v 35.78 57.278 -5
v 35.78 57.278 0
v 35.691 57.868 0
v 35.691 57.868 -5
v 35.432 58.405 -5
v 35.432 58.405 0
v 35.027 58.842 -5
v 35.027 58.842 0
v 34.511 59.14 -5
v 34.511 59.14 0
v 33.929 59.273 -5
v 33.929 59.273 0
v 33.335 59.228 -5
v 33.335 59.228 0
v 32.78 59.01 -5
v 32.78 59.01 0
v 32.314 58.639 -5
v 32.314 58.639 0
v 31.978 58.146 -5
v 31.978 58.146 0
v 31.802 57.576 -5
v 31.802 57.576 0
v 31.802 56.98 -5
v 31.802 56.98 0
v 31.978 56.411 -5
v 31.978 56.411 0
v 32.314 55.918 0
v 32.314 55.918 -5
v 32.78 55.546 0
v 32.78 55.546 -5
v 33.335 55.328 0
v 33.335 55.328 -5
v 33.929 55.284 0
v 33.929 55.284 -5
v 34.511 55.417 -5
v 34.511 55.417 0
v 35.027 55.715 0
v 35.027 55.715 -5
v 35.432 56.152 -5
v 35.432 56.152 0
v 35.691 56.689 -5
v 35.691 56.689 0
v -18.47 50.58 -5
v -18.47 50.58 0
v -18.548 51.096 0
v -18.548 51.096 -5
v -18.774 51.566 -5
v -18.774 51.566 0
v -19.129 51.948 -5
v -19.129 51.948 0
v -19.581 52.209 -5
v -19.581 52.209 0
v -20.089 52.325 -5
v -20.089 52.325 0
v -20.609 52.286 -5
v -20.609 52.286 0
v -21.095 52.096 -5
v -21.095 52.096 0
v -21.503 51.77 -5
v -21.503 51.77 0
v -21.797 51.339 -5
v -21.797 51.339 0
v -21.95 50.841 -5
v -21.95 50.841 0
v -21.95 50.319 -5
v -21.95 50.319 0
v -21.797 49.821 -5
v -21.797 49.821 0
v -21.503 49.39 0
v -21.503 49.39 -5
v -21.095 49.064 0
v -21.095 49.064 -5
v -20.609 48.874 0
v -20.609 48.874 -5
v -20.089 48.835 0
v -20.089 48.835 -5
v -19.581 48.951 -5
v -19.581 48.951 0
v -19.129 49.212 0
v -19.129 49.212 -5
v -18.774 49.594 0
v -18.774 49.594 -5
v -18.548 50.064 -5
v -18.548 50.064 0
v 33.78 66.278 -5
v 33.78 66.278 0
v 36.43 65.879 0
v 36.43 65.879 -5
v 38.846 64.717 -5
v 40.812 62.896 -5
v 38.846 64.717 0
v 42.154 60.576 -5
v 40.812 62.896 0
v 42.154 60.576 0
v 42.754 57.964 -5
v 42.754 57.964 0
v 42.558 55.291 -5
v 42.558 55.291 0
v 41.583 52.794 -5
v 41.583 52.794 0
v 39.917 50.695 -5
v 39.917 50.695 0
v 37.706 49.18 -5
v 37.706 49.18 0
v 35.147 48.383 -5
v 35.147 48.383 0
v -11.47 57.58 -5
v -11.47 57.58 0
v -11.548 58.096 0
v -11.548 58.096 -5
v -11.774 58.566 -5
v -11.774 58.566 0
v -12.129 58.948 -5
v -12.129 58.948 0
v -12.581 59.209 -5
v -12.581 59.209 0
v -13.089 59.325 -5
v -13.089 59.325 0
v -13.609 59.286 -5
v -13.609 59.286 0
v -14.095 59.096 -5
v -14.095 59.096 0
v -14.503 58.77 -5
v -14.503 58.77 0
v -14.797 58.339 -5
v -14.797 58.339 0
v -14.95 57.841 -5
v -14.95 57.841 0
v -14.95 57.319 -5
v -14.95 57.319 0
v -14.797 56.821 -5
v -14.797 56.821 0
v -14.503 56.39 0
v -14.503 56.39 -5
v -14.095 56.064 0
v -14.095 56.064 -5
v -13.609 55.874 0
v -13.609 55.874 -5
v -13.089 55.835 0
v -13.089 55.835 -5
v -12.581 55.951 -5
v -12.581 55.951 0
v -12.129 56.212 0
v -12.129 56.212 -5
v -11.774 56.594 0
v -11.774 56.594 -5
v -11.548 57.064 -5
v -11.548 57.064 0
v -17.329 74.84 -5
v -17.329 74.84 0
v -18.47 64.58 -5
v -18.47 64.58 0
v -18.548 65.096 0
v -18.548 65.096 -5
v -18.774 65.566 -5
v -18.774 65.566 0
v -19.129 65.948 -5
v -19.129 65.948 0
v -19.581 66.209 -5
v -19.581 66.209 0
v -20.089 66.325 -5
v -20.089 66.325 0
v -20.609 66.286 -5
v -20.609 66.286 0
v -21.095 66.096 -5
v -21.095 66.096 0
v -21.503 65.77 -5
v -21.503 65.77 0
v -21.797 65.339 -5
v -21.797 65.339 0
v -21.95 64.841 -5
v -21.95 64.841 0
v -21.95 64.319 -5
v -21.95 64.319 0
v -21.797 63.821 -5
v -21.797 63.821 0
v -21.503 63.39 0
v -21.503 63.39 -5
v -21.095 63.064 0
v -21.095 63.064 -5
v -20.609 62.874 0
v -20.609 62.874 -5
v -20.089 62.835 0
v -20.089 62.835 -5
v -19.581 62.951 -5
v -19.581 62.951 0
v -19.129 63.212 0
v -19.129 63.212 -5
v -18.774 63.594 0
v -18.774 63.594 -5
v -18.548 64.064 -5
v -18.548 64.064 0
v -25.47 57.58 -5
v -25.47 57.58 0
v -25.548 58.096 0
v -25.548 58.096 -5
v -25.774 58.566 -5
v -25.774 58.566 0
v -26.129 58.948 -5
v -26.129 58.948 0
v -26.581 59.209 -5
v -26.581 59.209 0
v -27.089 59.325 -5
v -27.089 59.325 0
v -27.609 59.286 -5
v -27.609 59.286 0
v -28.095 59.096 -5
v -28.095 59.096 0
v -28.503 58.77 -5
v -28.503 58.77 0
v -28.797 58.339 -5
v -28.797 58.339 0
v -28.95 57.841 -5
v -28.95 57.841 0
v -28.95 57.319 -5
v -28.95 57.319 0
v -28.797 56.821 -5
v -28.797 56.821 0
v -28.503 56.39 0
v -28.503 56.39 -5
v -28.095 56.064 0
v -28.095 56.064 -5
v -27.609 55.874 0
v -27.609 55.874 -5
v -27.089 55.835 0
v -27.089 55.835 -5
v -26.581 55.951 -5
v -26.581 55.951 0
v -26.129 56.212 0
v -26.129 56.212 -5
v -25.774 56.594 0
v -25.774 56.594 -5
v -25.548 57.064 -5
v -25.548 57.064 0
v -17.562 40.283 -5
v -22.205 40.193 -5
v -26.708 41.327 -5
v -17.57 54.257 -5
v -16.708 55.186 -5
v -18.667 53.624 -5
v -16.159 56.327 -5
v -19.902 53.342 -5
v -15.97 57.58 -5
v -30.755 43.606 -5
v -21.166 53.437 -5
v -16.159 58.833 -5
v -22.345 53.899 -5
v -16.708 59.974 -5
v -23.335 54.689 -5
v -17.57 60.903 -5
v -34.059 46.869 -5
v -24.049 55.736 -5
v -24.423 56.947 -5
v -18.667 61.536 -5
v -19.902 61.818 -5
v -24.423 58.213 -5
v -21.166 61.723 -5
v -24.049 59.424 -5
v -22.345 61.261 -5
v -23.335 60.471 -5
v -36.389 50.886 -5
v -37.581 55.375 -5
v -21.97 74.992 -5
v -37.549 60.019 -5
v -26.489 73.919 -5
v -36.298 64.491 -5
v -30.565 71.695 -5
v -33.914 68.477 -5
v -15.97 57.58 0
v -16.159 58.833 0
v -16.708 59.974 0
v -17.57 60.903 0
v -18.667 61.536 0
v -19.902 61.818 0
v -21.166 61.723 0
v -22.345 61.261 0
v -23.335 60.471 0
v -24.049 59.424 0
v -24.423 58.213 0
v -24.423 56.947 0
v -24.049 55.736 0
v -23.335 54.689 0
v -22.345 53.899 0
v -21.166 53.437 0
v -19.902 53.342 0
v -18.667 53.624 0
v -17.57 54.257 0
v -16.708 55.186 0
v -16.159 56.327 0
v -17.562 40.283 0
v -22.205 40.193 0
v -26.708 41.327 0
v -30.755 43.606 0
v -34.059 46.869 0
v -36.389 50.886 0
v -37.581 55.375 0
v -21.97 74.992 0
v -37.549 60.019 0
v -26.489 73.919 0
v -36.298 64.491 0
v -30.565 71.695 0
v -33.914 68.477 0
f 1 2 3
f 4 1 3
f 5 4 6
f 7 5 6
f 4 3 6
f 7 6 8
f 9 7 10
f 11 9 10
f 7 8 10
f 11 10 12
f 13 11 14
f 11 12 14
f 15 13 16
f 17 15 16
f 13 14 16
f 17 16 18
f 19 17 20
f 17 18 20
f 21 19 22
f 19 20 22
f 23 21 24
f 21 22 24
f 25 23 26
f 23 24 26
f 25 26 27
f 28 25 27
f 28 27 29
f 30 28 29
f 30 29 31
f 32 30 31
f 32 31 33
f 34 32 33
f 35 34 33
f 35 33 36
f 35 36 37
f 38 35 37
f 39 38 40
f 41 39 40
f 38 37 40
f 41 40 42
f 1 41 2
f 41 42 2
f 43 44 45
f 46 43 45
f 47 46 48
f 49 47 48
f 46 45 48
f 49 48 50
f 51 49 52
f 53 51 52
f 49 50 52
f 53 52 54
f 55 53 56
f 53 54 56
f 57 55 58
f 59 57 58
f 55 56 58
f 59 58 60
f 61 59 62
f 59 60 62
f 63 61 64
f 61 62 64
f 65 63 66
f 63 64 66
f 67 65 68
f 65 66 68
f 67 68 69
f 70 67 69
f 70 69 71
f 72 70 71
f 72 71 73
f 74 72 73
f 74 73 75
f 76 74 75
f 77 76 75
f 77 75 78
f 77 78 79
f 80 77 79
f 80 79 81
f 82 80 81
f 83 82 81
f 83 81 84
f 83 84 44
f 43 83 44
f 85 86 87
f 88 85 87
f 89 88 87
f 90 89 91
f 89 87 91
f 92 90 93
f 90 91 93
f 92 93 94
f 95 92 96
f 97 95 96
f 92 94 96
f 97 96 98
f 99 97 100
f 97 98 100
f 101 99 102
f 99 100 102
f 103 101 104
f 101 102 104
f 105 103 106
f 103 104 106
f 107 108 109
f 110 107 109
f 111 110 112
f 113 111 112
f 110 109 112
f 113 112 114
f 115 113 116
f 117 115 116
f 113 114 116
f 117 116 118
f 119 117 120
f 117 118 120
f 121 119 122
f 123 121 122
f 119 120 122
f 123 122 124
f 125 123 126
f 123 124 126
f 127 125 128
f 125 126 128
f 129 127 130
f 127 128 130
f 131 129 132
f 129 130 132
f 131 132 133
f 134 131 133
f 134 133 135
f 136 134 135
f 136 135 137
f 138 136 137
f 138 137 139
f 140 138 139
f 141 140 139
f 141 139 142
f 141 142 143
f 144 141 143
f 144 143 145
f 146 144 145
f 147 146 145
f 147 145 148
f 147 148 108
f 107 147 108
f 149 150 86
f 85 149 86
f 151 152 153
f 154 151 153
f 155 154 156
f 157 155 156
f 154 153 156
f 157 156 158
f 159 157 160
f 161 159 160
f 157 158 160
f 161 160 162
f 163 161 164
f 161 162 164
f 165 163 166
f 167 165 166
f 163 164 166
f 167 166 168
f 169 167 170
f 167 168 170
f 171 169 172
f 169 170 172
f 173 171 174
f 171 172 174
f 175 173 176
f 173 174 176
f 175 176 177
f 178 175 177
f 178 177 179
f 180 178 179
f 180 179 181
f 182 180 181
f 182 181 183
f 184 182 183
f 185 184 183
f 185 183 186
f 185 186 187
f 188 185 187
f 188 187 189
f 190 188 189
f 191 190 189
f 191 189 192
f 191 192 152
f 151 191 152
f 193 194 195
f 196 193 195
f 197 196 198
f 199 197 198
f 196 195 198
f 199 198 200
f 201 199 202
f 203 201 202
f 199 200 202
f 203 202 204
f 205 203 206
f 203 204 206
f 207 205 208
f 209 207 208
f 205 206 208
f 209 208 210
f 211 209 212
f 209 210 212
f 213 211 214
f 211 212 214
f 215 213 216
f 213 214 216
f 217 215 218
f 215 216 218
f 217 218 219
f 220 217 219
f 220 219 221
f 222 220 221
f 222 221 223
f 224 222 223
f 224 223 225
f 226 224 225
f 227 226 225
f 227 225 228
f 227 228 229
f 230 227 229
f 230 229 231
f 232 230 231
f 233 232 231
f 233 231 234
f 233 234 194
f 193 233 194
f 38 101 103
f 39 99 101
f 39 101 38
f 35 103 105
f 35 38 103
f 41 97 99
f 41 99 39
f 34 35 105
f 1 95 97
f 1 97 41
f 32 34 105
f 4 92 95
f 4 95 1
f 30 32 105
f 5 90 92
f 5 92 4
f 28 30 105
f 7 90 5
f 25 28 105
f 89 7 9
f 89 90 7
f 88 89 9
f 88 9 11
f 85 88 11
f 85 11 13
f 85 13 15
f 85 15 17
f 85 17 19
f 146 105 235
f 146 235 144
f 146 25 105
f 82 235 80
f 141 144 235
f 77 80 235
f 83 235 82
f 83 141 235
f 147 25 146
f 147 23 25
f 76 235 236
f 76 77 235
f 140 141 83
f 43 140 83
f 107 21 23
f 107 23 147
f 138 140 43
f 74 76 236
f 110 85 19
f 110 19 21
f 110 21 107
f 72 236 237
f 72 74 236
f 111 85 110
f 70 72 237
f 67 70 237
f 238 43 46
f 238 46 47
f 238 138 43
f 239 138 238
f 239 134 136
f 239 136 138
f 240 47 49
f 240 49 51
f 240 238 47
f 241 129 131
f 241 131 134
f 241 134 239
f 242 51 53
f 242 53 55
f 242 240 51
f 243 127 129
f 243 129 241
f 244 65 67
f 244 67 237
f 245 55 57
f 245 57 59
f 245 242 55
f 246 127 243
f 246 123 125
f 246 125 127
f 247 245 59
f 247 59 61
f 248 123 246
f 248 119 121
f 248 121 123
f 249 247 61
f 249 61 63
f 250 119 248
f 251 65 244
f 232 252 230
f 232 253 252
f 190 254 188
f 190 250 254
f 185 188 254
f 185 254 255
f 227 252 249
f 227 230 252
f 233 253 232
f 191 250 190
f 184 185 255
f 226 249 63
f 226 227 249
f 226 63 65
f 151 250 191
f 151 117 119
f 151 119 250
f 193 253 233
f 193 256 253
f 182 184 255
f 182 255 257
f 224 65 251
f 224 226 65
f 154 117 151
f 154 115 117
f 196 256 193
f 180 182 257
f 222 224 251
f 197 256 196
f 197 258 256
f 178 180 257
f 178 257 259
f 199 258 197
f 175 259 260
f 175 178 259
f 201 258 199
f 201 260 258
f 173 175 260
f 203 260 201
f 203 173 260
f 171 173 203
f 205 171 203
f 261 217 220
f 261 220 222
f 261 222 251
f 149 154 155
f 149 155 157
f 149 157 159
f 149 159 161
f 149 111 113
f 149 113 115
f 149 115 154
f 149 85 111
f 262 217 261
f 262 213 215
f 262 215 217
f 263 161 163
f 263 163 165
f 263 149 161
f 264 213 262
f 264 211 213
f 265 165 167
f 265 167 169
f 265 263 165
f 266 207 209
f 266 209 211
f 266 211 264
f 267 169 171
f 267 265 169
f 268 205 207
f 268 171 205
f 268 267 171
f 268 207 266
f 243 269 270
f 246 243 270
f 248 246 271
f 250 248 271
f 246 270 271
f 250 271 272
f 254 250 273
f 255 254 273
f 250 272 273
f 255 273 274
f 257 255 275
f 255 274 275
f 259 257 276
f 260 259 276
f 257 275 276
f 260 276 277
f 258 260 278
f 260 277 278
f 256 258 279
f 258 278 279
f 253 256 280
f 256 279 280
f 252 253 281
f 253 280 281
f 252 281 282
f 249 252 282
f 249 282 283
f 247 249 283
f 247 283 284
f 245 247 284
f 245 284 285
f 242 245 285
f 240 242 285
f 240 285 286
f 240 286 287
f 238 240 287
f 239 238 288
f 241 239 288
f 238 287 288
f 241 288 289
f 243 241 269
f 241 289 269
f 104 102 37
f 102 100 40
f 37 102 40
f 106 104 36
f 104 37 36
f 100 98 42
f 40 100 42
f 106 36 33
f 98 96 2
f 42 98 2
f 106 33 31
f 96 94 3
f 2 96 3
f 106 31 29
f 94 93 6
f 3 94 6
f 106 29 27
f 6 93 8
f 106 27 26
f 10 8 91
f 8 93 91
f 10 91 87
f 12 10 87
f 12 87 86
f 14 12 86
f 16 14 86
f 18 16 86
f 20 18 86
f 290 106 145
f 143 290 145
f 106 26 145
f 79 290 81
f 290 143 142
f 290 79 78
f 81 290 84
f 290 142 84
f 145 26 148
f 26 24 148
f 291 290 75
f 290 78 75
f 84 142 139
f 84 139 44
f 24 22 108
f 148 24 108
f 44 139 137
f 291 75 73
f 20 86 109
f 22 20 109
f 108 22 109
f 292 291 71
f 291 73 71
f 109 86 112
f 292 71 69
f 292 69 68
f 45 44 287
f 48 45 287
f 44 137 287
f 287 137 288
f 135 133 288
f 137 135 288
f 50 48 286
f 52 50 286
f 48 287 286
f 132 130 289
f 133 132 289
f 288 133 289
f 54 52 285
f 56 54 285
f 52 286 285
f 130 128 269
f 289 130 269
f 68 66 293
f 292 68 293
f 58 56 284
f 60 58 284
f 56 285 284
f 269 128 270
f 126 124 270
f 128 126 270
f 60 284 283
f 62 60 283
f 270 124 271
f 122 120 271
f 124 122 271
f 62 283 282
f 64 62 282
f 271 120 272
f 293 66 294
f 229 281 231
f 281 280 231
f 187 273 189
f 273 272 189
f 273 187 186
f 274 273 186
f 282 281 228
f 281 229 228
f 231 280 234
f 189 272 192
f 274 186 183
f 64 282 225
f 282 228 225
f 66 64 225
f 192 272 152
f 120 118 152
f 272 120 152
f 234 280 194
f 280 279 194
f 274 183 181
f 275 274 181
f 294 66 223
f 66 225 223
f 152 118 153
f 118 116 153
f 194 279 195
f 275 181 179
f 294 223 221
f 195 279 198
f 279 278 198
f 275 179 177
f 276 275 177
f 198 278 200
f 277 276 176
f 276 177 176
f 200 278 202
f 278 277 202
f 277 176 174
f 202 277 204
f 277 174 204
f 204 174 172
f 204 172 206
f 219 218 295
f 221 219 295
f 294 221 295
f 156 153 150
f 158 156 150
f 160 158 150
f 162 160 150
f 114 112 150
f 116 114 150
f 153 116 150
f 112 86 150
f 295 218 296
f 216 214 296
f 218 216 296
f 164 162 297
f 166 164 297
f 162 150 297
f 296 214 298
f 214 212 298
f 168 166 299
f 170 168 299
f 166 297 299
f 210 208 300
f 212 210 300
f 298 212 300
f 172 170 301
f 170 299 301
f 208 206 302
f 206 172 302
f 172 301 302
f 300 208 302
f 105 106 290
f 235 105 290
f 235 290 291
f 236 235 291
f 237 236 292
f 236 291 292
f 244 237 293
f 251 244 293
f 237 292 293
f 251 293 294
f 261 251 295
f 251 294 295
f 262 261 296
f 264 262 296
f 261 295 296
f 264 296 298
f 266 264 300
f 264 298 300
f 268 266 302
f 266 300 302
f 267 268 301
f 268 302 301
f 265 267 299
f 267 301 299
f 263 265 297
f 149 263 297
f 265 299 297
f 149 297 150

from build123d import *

# Parameters (mm, degrees)
SKETCH2_R           = 4.25
SKETCH2_R_2         = 2
BOSS_EXTRUDE1_DEPTH = 5
SKETCH_1_R          = 1.75
CUT_EXTRUDE_1_DEPTH = 10


with BuildPart() as part:
    # Sketch2 → Boss-Extrude1 (new body)
    with BuildSketch(Plane.XY):
        with BuildLine():
            Line((-17.328874887, 74.839530577), (33.78000003, 66.278338859))
            ThreePointArc((33.78000003, 66.278338859), (42.753857637, 57.963816533), (35.14697315, 48.382756557))
            Line((35.14697315, 48.382756557), (-17.561996681, 40.283034413))
            ThreePointArc((-17.561996681, 40.283034413), (-37.719601772, 57.698054173), (-17.328874887, 74.839530577))
        make_face()
        with Locations((-20.21999997, 57.58)):
            Circle(SKETCH2_R, mode=Mode.SUBTRACT)
        with Locations((33.78000003, 57.278338859)):
            Circle(SKETCH2_R_2, mode=Mode.SUBTRACT)
    extrude(amount=-BOSS_EXTRUDE1_DEPTH)

    # 草图1 → 切除-拉伸1 (cut)
    with BuildSketch(Plane.XY):
        with Locations((-13.21999997, 57.58)):
            Circle(SKETCH_1_R)
        with Locations((-27.21999997, 57.58)):
            Circle(SKETCH_1_R)
        with Locations((-20.21999997, 64.58)):
            Circle(SKETCH_1_R)
        with Locations((-20.21999997, 50.58)):
            Circle(SKETCH_1_R)
    extrude(amount=-CUT_EXTRUDE_1_DEPTH, mode=Mode.SUBTRACT)


solid = part.part
